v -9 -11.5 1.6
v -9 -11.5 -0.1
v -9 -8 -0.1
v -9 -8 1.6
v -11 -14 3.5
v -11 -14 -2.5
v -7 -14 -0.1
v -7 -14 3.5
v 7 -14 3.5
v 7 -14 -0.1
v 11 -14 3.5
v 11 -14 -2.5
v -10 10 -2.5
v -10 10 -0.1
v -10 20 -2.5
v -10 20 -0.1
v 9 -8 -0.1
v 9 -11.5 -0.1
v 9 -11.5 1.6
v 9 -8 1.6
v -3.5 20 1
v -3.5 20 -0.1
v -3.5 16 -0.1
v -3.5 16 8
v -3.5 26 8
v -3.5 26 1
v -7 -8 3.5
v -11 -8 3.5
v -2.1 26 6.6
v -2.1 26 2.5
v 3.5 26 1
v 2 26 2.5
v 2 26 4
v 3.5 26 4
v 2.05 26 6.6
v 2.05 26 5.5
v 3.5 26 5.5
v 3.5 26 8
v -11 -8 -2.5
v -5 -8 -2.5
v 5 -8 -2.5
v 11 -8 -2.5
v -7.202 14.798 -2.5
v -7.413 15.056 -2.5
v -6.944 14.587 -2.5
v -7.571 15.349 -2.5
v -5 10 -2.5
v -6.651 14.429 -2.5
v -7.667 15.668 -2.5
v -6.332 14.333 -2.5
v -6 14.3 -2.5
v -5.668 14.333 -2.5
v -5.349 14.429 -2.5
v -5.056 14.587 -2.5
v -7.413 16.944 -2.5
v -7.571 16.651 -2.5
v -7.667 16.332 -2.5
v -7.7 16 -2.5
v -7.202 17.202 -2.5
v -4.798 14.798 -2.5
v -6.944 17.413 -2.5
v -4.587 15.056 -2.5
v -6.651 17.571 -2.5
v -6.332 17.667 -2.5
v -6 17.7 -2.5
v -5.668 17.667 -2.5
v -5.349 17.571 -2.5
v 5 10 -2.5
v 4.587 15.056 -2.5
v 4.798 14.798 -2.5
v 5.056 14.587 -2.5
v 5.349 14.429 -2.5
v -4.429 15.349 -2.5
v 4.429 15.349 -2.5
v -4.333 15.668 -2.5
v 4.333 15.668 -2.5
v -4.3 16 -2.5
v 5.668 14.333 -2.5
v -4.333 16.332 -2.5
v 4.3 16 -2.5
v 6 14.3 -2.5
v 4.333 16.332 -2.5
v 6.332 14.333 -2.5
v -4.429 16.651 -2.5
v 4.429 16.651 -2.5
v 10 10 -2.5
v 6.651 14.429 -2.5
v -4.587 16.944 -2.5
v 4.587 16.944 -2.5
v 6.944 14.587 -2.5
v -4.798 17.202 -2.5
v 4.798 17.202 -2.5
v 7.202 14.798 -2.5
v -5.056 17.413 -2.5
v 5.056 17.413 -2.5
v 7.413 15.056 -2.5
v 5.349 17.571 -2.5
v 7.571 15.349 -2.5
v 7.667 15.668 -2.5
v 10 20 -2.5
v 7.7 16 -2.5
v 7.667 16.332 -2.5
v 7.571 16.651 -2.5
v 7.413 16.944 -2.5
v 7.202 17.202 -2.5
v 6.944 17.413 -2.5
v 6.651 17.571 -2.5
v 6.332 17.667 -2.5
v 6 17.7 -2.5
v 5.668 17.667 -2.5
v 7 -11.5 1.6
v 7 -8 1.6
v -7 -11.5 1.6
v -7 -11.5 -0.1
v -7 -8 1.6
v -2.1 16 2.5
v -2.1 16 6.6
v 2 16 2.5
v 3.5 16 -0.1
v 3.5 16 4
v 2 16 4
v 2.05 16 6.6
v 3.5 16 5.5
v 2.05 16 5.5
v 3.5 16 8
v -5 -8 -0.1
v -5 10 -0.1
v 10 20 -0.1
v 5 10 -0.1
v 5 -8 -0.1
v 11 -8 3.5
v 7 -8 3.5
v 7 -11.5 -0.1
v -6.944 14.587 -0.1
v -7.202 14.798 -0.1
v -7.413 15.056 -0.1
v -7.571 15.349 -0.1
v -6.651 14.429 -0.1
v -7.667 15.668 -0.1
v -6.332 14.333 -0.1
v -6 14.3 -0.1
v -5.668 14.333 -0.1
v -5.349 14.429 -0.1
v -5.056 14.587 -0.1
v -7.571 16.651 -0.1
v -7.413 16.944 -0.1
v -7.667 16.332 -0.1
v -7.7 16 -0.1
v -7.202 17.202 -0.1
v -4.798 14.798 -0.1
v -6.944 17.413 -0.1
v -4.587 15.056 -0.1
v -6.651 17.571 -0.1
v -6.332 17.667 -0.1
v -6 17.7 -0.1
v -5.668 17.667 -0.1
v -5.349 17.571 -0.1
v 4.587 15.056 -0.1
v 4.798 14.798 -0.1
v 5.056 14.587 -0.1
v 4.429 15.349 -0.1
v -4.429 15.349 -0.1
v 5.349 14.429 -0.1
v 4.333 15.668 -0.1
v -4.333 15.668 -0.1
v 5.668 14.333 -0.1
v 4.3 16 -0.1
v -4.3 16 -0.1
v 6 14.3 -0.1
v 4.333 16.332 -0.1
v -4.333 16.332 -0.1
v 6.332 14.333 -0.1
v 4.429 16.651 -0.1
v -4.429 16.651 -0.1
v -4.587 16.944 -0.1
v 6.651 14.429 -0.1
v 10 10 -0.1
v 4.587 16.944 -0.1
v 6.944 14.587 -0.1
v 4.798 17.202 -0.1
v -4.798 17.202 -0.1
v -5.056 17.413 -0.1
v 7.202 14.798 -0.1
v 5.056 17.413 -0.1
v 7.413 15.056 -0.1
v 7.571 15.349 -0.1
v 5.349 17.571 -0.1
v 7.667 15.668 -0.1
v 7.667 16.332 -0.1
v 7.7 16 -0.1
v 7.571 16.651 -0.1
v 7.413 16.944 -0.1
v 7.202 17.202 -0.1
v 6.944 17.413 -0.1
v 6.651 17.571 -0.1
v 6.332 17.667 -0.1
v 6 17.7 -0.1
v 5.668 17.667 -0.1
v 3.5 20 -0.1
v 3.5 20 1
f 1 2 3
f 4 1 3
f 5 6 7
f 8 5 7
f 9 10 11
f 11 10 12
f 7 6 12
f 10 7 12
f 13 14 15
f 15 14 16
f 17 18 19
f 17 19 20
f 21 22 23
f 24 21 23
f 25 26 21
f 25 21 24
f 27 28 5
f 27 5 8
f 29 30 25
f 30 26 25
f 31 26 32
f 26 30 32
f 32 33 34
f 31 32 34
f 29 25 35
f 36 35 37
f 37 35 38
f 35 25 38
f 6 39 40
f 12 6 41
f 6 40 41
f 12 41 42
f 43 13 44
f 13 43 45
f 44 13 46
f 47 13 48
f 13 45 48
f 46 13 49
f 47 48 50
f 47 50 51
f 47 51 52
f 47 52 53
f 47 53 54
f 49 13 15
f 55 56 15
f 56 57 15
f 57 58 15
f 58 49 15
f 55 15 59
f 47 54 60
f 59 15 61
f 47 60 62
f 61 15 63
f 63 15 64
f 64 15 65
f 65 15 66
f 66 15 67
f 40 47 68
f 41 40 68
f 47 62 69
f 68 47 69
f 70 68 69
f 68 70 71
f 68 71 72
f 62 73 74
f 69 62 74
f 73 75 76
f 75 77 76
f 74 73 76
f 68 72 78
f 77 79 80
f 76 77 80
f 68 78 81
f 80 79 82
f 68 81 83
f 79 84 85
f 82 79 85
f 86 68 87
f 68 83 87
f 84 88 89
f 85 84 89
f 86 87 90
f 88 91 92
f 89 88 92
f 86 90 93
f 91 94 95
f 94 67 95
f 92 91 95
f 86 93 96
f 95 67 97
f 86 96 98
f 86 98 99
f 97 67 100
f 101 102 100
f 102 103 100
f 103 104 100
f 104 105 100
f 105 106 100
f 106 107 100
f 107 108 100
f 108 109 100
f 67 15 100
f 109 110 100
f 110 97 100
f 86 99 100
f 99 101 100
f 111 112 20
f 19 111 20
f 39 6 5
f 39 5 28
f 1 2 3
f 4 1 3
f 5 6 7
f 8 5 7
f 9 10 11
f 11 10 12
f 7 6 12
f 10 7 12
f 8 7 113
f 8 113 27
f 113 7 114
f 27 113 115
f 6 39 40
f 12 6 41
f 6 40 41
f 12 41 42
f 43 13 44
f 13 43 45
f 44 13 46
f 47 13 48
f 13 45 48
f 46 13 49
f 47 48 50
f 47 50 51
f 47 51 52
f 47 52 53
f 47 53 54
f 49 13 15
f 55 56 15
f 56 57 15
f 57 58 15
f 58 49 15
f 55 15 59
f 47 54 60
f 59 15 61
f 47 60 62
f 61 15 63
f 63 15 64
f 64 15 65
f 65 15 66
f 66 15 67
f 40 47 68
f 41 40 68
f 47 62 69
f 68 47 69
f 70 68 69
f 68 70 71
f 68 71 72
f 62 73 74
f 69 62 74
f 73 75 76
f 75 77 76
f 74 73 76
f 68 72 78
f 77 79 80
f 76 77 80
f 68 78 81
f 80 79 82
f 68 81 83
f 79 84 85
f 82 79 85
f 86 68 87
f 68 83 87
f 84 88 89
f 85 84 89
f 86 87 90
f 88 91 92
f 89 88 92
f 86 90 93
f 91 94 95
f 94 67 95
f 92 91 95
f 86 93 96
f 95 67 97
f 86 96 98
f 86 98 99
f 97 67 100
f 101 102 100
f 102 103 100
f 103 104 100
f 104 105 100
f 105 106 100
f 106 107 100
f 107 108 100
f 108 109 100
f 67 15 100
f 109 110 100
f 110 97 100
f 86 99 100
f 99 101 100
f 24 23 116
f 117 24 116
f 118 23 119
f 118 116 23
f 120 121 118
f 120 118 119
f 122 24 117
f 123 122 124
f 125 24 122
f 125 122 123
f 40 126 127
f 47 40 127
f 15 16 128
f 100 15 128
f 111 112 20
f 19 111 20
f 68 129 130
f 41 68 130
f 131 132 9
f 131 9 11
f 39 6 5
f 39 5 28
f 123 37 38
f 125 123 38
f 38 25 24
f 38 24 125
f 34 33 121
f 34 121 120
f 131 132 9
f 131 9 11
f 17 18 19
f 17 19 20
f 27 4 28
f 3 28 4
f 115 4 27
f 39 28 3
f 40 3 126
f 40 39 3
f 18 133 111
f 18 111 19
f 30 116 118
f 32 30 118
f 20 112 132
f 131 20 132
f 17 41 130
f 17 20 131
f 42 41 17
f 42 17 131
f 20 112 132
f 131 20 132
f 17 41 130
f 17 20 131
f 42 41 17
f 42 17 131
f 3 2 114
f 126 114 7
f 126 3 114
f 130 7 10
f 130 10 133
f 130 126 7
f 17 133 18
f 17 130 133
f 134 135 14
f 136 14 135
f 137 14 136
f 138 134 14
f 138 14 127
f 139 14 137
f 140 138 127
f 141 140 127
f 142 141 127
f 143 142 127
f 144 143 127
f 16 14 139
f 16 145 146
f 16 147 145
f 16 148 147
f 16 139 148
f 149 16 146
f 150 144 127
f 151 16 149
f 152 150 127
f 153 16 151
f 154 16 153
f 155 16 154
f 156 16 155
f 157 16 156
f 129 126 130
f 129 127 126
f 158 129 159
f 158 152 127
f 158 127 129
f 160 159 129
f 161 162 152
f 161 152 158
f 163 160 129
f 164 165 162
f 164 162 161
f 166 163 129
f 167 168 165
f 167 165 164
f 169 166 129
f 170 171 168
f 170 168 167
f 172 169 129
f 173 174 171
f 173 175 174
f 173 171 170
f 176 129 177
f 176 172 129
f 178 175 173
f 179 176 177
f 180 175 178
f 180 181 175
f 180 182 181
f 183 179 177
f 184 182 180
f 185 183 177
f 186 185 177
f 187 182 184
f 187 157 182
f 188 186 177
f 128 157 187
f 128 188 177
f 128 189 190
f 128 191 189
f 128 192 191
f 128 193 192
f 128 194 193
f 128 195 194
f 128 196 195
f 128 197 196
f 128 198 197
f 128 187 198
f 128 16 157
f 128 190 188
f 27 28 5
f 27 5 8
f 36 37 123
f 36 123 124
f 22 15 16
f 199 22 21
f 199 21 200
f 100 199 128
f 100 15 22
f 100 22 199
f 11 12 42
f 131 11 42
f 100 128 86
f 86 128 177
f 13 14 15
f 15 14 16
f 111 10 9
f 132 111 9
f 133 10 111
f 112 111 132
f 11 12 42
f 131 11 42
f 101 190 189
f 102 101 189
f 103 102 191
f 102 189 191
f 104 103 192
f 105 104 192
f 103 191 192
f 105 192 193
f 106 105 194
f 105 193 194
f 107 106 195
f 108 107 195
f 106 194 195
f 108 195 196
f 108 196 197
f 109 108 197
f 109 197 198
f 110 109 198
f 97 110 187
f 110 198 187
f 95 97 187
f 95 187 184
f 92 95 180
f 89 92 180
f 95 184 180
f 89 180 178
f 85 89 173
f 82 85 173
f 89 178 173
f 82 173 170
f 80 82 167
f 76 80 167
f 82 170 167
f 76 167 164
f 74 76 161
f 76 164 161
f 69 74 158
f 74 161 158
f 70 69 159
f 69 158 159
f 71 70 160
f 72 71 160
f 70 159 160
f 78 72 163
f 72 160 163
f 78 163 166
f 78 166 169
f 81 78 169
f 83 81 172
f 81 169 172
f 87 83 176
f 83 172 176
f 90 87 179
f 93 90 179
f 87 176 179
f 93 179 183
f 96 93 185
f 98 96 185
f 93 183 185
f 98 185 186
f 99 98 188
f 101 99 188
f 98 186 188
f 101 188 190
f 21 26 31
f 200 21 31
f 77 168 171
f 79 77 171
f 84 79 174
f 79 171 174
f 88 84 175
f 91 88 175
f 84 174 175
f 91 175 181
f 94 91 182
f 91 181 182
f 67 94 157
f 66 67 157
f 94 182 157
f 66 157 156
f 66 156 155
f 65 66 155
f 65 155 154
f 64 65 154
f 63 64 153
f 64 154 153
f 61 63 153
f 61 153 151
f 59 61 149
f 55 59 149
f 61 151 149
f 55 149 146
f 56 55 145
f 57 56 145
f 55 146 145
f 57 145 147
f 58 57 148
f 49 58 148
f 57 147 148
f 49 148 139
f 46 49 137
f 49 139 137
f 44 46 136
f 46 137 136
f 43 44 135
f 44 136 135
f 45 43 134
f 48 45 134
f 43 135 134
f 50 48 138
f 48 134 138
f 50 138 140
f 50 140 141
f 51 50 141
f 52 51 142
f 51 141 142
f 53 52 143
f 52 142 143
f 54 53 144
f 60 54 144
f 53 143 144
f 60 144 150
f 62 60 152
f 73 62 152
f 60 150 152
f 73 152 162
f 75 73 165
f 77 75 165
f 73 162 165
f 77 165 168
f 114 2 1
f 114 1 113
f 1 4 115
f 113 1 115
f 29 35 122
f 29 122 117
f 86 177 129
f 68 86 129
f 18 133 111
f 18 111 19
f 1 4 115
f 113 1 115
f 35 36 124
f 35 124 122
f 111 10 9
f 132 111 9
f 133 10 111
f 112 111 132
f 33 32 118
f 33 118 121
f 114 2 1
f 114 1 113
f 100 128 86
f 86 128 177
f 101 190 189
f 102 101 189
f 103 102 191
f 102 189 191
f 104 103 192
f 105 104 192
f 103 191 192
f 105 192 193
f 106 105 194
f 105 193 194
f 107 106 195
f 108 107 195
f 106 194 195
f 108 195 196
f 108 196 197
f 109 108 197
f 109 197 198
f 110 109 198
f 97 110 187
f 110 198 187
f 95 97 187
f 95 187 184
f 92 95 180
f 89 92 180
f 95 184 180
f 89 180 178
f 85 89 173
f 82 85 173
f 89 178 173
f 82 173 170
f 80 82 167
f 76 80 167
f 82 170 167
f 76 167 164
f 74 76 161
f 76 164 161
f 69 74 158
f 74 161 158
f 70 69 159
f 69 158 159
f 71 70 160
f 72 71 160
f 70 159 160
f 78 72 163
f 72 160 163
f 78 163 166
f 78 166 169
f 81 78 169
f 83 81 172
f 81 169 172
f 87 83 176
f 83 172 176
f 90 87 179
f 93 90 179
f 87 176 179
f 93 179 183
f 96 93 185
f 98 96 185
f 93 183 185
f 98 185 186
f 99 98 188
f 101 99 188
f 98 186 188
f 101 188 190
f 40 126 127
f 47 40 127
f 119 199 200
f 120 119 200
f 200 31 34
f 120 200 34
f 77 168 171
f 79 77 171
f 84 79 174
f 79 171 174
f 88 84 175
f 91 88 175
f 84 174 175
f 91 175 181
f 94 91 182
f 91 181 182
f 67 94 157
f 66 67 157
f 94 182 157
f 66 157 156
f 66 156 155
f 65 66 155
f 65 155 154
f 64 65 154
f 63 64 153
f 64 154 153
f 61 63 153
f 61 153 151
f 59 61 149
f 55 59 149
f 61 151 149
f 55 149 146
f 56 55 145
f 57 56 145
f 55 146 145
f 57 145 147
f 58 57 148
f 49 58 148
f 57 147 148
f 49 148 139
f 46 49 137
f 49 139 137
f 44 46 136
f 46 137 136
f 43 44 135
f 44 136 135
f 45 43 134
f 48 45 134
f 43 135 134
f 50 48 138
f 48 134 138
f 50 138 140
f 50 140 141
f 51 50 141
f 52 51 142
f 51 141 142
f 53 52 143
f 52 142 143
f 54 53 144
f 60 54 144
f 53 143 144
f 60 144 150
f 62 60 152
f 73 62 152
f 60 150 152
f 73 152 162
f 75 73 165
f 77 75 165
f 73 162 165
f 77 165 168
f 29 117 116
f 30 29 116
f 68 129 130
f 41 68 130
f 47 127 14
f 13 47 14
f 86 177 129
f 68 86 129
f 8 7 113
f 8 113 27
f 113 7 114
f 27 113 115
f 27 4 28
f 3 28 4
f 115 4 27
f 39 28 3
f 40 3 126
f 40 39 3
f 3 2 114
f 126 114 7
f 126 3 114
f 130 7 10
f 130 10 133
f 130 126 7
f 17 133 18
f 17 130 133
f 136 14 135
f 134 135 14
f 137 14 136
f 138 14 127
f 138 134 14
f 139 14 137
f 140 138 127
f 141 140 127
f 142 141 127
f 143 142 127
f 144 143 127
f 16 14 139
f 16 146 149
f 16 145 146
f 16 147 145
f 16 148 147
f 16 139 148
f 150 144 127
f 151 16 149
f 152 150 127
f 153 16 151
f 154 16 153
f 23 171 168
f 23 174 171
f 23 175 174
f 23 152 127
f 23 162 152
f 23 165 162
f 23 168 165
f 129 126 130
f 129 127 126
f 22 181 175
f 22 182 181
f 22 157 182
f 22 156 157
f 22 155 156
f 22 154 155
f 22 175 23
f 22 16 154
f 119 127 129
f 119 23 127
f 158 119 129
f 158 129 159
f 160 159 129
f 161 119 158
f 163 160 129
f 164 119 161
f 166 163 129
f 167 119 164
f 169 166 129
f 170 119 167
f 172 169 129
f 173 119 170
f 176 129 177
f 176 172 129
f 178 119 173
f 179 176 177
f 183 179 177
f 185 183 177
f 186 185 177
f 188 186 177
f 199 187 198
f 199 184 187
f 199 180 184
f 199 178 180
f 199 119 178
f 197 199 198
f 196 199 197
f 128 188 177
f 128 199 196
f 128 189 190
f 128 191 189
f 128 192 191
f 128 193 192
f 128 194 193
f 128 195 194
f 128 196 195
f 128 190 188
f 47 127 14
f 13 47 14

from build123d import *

# Parameters (mm, degrees)
SKETCH003_R      = 1.7
EXTRUDE003_DEPTH = 2.4
BOX001_W         = 7
BOX001_H         = 4
BOX001_DEPTH     = 3
SKETCH001_W      = 2.5
SKETCH001_H      = 8
EXTRUDE001_DEPTH = 9
BOX_W            = 14
BOX_H            = 15
BOX_DEPTH        = 8.5
SKETCH_W         = 18
SKETCH_H         = 23
EXTRUDE_DEPTH    = 1.7
SKETCH002_W      = 22
SKETCH002_H      = 6
EXTRUDE002_DEPTH = 6
EXTRUDE004_DEPTH = 10
SKETCH005_W      = 7
SKETCH005_H      = 7
EXTRUDE005_DEPTH = 10


with BuildPart() as extrude003:
    # Sketch003 → Extrude003 (new body)
    with BuildSketch(Plane.XY):
        Polygon((-10, 20), (10, 20), (10, 10), (5, 10), (5, -8), (-5, -8), (-5, 10), (-10, 10), align=None)
        with Locations((-6, 16)):
            Circle(SKETCH003_R, mode=Mode.SUBTRACT)
        with Locations((6, 16)):
            Circle(SKETCH003_R, mode=Mode.SUBTRACT)
    extrude(amount=-EXTRUDE003_DEPTH)


with BuildPart() as extrude003_1:
    # Extrude003 placement: moved
    add(extrude003.part.moved(Location((0, 0, -0.1))))


with BuildPart() as cube001:
    # Box001 → Box001 (new body)
    with BuildSketch(Plane(origin=(-3.5, 16, -1), x_dir=(1, 0, 0), z_dir=(0, 0, 1))):
        with Locations((3.5, 2)):
            Rectangle(BOX001_W, BOX001_H)
    extrude(amount=BOX001_DEPTH)


with BuildPart() as extrude001:
    # Sketch001 → Extrude001 (new body)
    with BuildSketch(Plane.XY):
        with Locations((7.75, 5.5)):
            Rectangle(SKETCH001_W, SKETCH001_H)
    extrude(amount=EXTRUDE001_DEPTH)


with BuildPart() as extrude001_1:
    # Extrude001 placement: moved
    add(extrude001.part.moved(Location((0, 0, 1.6))))


with BuildPart() as part_mirroring:
    # Part__Mirroring: instance of Extrude001
    add(extrude001_1.part.mirror(Plane(origin=(0, 0, 0), x_dir=(0, -1, 0), z_dir=(1, 0, 0))))


with BuildPart() as cube:
    # Box → Box (new body)
    with BuildSketch(Plane(origin=(-7, -16.5, -0.1), x_dir=(1, 0, 0), z_dir=(0, 0, 1))):
        with Locations((7, 7.5)):
            Rectangle(BOX_W, BOX_H)
    extrude(amount=BOX_DEPTH)


with BuildPart() as fusion:
    # Sketch → Extrude (new body)
    with BuildSketch(Plane.XY):
        Rectangle(SKETCH_W, SKETCH_H)
    extrude(amount=EXTRUDE_DEPTH)


with BuildPart() as fusion_1:
    # Extrude placement: moved
    add(fusion.part.moved(Location((0, 0, -0.1))))

    # Fusion: union Part__Mirroring, Extrude001, Cube
    add(part_mirroring.part)
    add(extrude001_1.part)
    add(cube.part)


with BuildPart() as cut:
    # Sketch002 → Extrude002 (new body)
    with BuildSketch(Plane.XY):
        with Locations((0, -11)):
            Rectangle(SKETCH002_W, SKETCH002_H)
    extrude(amount=EXTRUDE002_DEPTH)


with BuildPart() as cut_1:
    # Extrude002 placement: moved
    add(cut.part.moved(Location((0, 0, -2.5))))

    # Cut: cut Fusion
    add(fusion_1.part, mode=Mode.SUBTRACT)


with BuildPart() as extrude004:
    # Sketch004 → Extrude004 (new body)
    with BuildSketch(Plane.XZ):
        Polygon((-2.1, 2.5), (2, 2.5), (2, 4), (5, 4), (5, 5.5), (2.05, 5.5), (2.05, 6.6), (-2.1, 6.6), align=None)
    extrude(amount=EXTRUDE004_DEPTH)


with BuildPart() as fusion002:
    # Sketch005 → Extrude005 (new body)
    with BuildSketch(Plane.XZ):
        with Locations((0, 4.5)):
            Rectangle(SKETCH005_W, SKETCH005_H)
    extrude(amount=EXTRUDE005_DEPTH)

    # Cut001: cut Extrude004
    add(extrude004.part, mode=Mode.SUBTRACT)


with BuildPart() as fusion002_1:
    # Cut001 placement: moved
    add(fusion002.part.moved(Location((0, 26, 0))))

    # Fusion001: union Extrude003
    add(extrude003_1.part)

    # Fusion002: union Extrude003, Cube001, Cut
    add(extrude003_1.part)
    add(cube001.part)
    add(cut_1.part)


with BuildPart() as fusion003:
    # Fusion003 base: copy of Cut
    add(cut_1.part)

    # Fusion003: union Extrude003
    add(extrude003_1.part)


solid = Compound([fusion002_1.part, fusion003.part])
